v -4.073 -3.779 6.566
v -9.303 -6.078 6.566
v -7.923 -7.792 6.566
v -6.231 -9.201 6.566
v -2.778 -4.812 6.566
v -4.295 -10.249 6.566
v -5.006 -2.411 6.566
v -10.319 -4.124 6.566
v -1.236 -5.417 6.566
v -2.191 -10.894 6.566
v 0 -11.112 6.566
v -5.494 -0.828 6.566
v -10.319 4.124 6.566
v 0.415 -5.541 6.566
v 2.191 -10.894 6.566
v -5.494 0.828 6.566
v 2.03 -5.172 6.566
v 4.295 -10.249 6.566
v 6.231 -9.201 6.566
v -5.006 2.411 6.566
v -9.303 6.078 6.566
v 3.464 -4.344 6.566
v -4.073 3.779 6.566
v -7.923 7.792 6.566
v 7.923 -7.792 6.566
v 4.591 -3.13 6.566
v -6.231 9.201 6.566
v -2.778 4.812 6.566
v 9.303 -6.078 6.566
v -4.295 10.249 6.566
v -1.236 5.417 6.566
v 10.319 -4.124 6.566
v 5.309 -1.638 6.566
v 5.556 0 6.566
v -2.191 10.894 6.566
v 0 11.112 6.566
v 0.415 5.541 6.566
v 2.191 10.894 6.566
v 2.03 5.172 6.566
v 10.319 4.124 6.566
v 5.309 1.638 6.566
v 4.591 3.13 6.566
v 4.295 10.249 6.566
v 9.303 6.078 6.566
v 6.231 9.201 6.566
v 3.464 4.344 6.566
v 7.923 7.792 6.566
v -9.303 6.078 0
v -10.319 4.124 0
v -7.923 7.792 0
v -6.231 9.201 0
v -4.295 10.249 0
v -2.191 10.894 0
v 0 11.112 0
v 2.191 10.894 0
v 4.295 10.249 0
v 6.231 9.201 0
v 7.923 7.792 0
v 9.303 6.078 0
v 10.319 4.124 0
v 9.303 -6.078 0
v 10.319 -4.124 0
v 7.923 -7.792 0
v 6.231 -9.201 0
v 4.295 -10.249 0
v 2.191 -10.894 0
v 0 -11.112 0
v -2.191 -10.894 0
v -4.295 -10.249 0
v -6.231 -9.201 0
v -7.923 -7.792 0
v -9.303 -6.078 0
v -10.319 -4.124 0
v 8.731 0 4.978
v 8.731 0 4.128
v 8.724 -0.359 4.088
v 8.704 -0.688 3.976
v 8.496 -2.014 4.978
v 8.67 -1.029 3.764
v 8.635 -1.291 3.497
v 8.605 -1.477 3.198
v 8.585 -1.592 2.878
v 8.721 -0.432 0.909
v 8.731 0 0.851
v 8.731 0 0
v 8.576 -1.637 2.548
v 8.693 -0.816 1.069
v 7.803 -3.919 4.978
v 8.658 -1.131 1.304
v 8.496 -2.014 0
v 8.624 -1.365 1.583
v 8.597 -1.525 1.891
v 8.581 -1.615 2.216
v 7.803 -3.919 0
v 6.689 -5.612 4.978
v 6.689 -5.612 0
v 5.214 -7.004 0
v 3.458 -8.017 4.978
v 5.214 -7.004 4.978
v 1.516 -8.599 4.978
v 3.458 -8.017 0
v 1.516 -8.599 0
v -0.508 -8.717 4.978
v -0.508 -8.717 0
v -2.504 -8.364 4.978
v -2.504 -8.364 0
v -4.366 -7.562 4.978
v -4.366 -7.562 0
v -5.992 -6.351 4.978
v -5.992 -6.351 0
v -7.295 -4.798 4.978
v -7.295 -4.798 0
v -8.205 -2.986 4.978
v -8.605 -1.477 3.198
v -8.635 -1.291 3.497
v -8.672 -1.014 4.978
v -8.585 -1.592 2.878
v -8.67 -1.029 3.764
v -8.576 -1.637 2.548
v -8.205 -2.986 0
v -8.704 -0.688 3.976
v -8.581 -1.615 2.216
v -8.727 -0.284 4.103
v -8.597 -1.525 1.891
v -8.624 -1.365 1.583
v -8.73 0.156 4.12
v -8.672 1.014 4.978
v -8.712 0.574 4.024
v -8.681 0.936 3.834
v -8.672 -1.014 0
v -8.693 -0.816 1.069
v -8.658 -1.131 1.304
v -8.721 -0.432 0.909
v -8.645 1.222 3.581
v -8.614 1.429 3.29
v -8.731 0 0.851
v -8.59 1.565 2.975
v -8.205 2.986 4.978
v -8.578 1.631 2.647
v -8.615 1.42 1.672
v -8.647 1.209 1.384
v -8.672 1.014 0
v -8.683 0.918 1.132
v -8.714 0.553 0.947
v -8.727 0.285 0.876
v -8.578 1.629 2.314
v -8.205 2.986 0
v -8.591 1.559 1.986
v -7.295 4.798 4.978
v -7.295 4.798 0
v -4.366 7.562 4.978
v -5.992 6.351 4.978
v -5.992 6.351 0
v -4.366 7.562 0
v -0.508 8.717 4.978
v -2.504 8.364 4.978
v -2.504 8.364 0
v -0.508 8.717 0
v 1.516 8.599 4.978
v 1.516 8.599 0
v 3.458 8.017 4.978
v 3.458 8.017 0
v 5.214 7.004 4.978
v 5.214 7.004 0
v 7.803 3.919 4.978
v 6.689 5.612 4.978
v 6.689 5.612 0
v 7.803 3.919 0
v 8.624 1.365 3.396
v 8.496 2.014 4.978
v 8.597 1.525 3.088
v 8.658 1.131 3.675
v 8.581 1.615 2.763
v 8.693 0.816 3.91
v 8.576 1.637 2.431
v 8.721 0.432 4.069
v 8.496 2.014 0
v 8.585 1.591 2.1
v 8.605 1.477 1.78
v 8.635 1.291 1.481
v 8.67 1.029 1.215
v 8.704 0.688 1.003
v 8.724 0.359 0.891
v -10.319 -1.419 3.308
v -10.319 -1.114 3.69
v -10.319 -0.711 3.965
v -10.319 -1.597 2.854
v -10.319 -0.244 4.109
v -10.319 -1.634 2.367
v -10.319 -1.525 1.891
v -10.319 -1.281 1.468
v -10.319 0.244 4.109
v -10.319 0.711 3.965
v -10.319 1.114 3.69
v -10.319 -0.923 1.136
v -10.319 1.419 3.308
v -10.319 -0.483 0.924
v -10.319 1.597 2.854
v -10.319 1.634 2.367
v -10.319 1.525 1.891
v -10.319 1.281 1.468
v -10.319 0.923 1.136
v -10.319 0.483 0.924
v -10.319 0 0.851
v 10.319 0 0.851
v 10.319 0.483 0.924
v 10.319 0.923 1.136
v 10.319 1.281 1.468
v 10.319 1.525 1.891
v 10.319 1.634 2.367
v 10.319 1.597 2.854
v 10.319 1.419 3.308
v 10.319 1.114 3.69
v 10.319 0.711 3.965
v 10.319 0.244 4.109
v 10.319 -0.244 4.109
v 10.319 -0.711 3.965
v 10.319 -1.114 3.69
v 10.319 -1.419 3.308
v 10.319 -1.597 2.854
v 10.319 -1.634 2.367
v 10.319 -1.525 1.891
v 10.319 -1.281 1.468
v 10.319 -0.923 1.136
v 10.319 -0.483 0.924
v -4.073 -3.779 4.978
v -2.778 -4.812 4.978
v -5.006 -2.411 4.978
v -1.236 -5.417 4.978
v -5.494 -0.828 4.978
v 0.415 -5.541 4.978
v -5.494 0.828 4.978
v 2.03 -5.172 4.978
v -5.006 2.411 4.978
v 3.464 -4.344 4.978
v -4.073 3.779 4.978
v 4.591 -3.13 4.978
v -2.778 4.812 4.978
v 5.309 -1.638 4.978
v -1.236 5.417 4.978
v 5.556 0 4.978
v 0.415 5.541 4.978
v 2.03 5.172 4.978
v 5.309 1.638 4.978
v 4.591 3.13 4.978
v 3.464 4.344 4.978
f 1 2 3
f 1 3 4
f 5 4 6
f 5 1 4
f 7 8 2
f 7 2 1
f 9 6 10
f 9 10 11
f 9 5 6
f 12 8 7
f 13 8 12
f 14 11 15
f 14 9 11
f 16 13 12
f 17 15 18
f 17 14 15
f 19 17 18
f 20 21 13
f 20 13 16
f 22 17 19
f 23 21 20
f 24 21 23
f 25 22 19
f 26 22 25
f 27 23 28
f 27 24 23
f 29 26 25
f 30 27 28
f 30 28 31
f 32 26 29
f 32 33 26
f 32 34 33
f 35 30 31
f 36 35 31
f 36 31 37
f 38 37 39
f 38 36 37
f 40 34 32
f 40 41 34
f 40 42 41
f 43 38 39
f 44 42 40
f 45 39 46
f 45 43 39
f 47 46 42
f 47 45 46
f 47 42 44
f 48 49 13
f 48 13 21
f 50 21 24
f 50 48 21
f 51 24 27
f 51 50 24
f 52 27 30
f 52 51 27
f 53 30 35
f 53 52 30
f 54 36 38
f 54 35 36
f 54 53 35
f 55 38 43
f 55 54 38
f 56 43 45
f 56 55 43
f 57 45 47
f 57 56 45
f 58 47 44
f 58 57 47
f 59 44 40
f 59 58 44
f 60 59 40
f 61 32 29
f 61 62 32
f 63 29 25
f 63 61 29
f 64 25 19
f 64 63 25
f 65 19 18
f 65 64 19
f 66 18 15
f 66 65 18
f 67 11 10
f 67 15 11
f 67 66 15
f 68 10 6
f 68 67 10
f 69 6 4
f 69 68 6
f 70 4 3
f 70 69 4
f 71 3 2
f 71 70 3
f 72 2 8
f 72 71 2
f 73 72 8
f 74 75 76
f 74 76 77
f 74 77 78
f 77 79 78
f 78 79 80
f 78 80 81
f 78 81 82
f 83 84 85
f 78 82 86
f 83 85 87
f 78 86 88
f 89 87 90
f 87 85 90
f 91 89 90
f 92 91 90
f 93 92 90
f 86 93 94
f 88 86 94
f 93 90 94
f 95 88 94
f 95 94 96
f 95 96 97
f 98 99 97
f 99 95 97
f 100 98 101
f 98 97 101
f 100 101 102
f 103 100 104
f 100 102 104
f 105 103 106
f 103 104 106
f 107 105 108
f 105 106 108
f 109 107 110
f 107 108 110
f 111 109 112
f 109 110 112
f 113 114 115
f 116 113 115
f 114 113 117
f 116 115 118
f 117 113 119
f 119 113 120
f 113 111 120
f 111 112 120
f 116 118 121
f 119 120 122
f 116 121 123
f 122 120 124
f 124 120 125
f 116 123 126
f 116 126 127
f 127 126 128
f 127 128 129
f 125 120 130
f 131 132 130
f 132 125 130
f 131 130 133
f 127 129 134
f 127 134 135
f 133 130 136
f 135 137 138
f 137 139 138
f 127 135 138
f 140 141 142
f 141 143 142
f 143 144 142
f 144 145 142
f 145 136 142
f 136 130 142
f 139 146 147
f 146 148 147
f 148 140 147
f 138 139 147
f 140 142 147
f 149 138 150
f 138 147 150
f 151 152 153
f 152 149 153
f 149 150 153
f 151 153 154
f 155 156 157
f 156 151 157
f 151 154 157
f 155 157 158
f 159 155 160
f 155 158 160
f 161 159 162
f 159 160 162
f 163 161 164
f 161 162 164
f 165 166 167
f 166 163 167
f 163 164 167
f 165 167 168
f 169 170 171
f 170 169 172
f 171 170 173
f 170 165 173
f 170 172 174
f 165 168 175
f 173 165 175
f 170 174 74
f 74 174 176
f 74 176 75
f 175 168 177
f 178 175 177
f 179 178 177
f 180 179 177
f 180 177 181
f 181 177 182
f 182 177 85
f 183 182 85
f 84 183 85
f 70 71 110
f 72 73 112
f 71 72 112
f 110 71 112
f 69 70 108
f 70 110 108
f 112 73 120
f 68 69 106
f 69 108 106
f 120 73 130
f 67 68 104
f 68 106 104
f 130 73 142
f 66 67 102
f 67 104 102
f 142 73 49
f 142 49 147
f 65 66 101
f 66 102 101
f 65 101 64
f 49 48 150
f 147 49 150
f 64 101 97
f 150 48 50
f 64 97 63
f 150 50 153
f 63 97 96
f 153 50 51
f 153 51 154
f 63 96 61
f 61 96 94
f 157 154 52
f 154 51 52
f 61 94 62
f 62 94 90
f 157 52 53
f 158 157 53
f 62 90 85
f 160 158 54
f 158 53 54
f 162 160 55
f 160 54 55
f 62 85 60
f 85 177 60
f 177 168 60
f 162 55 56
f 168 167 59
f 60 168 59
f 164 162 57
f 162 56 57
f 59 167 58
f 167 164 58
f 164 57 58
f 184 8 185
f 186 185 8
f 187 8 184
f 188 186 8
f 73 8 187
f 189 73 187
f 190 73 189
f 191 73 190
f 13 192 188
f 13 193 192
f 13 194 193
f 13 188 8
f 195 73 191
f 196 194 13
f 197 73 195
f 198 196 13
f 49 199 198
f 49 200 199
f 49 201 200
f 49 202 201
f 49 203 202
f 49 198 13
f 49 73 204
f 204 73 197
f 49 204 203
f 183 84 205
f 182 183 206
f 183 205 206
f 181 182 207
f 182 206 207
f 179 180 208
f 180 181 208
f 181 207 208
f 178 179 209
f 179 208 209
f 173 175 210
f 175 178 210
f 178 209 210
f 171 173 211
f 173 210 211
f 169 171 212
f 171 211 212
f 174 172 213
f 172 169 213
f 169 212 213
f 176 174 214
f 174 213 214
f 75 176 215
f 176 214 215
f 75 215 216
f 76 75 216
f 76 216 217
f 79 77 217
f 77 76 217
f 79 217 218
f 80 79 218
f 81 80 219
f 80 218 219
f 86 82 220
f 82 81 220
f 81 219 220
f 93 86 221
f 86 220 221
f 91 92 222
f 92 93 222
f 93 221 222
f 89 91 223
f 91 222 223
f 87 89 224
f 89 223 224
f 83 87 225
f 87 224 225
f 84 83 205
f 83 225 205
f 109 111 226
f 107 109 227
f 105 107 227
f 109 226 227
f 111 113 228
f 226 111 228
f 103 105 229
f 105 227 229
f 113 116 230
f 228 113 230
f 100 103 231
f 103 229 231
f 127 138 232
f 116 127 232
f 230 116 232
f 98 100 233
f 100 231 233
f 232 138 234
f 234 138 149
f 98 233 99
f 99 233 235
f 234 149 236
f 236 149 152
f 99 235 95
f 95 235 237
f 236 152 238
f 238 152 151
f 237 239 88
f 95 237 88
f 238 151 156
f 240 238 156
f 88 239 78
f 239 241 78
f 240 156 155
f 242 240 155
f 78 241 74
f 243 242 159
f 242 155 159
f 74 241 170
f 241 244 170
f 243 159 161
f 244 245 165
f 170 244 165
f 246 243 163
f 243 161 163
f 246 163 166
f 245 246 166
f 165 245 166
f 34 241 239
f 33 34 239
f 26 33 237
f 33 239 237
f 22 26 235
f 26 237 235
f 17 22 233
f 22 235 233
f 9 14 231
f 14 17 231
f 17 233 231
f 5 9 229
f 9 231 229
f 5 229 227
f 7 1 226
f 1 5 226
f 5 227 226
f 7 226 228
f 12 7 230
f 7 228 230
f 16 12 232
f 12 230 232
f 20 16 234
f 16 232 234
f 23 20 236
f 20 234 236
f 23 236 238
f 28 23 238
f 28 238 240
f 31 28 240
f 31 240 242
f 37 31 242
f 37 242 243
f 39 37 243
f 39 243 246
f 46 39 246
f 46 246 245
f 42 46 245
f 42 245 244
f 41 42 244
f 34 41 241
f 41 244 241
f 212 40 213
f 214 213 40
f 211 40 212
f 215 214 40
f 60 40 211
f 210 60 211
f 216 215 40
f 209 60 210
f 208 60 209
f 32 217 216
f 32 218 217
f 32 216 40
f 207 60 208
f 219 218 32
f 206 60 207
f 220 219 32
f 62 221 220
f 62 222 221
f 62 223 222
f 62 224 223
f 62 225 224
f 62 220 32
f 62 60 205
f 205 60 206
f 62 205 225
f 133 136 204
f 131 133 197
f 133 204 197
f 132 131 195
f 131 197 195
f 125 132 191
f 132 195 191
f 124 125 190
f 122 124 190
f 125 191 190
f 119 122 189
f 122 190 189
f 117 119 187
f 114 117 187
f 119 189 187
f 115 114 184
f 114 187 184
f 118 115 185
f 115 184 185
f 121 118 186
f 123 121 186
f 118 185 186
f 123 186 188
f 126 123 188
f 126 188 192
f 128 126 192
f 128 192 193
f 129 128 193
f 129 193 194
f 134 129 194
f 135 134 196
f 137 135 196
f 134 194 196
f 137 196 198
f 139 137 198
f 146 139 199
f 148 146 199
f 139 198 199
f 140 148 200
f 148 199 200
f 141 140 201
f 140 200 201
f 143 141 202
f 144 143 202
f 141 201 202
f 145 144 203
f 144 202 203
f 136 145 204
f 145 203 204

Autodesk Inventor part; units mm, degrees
ref_plane "YZ Plane" through (0, 0, 0) normal (1, 0, 0) x (0, 1, 0)
ref_plane "XZ Plane" through (0, 0, 0) normal (0, 1, 0) x (-1, 0, 0)
ref_plane "XY Plane" through (0, 0, 0) normal (0, 0, 1) x (1, 0, 0)
sketch "Sketch1" plane through (0, 0, 0) normal (0, 0, 1) x (1, 0, 0)
  circle A0 centre (0, 0) radius 11.1125
  circle A1 centre (0, 0) radius 6.35
  circle A2 centre (0, 0) radius 8.7313
  dimension "d0" = 22.225
  dimension "d1" = 12.7
  dimension "d34" = 2.3813
  dimension "d35" = 2.3813
extrude "Extrusion3" add sketch "Sketch1" along normal blind 4.9784 contours A0
sketch "Sketch2" plane through (0, 0, 4.9784) normal (0, 0, 1) x (1, 0, 0)
  circle A0 centre (0, 0) radius 11.1125 projected
  circle A1 centre (0, 0) radius 5.5563
  dimension "d36" = 11.1125
extrude "Extrusion4" add sketch "Sketch2" along normal blind 1.5875
sketch "Sketch3" plane through (0, 0, 0) normal (1, 0, 0) x (0, 1, 0)
  line L0 (-8.7313, 4.9784) -> (8.7313, 4.9784) projected
  line L1 (8.7313, 0) -> (-8.7313, 0) projected
  line L2 (0, 0) -> (0, 4.9784) construction
  point P0 (0, 2.4892)
hole "Hole2" at (0, 0, 2.4892) direction (-1, 0, 0) diameter 3.2766 end through all clearance for "Flat Head Machine Screw (82)" size "#4" standard "Ansi Unified Screw Threads"
sketch "Sketch4" plane through (0, 0, 0) normal (0, 0, -1) x (-1, 0, 0)
  circle A0 centre (0, 0) radius 11.1125 projected
  line L0 (0, 0) -> (-11.1125, 0) construction
  line L1 (-10.3187, 4.1244) -> (-10.3187, -4.1244)
  circle A1 centre (0, 0) radius 7.9375 construction
  point P0 (-7.9375, 0)
  point P1 (-10.3187, 0)
  dimension "d30" = 15.875
  dimension "d29" = 0.7937
extrude "Extrusion5" cut sketch "Sketch4" against normal through all contours L1 A0 picked at (-10.5166, 0.7)
mirror "Mirror1" about plane through (0, 0, 0) normal (1, 0, 0) of "Hole2", "Extrusion5"
equation "\"d34\" = d35"
properties part number "Pneumatic Connector -Shaft Side Cover"
